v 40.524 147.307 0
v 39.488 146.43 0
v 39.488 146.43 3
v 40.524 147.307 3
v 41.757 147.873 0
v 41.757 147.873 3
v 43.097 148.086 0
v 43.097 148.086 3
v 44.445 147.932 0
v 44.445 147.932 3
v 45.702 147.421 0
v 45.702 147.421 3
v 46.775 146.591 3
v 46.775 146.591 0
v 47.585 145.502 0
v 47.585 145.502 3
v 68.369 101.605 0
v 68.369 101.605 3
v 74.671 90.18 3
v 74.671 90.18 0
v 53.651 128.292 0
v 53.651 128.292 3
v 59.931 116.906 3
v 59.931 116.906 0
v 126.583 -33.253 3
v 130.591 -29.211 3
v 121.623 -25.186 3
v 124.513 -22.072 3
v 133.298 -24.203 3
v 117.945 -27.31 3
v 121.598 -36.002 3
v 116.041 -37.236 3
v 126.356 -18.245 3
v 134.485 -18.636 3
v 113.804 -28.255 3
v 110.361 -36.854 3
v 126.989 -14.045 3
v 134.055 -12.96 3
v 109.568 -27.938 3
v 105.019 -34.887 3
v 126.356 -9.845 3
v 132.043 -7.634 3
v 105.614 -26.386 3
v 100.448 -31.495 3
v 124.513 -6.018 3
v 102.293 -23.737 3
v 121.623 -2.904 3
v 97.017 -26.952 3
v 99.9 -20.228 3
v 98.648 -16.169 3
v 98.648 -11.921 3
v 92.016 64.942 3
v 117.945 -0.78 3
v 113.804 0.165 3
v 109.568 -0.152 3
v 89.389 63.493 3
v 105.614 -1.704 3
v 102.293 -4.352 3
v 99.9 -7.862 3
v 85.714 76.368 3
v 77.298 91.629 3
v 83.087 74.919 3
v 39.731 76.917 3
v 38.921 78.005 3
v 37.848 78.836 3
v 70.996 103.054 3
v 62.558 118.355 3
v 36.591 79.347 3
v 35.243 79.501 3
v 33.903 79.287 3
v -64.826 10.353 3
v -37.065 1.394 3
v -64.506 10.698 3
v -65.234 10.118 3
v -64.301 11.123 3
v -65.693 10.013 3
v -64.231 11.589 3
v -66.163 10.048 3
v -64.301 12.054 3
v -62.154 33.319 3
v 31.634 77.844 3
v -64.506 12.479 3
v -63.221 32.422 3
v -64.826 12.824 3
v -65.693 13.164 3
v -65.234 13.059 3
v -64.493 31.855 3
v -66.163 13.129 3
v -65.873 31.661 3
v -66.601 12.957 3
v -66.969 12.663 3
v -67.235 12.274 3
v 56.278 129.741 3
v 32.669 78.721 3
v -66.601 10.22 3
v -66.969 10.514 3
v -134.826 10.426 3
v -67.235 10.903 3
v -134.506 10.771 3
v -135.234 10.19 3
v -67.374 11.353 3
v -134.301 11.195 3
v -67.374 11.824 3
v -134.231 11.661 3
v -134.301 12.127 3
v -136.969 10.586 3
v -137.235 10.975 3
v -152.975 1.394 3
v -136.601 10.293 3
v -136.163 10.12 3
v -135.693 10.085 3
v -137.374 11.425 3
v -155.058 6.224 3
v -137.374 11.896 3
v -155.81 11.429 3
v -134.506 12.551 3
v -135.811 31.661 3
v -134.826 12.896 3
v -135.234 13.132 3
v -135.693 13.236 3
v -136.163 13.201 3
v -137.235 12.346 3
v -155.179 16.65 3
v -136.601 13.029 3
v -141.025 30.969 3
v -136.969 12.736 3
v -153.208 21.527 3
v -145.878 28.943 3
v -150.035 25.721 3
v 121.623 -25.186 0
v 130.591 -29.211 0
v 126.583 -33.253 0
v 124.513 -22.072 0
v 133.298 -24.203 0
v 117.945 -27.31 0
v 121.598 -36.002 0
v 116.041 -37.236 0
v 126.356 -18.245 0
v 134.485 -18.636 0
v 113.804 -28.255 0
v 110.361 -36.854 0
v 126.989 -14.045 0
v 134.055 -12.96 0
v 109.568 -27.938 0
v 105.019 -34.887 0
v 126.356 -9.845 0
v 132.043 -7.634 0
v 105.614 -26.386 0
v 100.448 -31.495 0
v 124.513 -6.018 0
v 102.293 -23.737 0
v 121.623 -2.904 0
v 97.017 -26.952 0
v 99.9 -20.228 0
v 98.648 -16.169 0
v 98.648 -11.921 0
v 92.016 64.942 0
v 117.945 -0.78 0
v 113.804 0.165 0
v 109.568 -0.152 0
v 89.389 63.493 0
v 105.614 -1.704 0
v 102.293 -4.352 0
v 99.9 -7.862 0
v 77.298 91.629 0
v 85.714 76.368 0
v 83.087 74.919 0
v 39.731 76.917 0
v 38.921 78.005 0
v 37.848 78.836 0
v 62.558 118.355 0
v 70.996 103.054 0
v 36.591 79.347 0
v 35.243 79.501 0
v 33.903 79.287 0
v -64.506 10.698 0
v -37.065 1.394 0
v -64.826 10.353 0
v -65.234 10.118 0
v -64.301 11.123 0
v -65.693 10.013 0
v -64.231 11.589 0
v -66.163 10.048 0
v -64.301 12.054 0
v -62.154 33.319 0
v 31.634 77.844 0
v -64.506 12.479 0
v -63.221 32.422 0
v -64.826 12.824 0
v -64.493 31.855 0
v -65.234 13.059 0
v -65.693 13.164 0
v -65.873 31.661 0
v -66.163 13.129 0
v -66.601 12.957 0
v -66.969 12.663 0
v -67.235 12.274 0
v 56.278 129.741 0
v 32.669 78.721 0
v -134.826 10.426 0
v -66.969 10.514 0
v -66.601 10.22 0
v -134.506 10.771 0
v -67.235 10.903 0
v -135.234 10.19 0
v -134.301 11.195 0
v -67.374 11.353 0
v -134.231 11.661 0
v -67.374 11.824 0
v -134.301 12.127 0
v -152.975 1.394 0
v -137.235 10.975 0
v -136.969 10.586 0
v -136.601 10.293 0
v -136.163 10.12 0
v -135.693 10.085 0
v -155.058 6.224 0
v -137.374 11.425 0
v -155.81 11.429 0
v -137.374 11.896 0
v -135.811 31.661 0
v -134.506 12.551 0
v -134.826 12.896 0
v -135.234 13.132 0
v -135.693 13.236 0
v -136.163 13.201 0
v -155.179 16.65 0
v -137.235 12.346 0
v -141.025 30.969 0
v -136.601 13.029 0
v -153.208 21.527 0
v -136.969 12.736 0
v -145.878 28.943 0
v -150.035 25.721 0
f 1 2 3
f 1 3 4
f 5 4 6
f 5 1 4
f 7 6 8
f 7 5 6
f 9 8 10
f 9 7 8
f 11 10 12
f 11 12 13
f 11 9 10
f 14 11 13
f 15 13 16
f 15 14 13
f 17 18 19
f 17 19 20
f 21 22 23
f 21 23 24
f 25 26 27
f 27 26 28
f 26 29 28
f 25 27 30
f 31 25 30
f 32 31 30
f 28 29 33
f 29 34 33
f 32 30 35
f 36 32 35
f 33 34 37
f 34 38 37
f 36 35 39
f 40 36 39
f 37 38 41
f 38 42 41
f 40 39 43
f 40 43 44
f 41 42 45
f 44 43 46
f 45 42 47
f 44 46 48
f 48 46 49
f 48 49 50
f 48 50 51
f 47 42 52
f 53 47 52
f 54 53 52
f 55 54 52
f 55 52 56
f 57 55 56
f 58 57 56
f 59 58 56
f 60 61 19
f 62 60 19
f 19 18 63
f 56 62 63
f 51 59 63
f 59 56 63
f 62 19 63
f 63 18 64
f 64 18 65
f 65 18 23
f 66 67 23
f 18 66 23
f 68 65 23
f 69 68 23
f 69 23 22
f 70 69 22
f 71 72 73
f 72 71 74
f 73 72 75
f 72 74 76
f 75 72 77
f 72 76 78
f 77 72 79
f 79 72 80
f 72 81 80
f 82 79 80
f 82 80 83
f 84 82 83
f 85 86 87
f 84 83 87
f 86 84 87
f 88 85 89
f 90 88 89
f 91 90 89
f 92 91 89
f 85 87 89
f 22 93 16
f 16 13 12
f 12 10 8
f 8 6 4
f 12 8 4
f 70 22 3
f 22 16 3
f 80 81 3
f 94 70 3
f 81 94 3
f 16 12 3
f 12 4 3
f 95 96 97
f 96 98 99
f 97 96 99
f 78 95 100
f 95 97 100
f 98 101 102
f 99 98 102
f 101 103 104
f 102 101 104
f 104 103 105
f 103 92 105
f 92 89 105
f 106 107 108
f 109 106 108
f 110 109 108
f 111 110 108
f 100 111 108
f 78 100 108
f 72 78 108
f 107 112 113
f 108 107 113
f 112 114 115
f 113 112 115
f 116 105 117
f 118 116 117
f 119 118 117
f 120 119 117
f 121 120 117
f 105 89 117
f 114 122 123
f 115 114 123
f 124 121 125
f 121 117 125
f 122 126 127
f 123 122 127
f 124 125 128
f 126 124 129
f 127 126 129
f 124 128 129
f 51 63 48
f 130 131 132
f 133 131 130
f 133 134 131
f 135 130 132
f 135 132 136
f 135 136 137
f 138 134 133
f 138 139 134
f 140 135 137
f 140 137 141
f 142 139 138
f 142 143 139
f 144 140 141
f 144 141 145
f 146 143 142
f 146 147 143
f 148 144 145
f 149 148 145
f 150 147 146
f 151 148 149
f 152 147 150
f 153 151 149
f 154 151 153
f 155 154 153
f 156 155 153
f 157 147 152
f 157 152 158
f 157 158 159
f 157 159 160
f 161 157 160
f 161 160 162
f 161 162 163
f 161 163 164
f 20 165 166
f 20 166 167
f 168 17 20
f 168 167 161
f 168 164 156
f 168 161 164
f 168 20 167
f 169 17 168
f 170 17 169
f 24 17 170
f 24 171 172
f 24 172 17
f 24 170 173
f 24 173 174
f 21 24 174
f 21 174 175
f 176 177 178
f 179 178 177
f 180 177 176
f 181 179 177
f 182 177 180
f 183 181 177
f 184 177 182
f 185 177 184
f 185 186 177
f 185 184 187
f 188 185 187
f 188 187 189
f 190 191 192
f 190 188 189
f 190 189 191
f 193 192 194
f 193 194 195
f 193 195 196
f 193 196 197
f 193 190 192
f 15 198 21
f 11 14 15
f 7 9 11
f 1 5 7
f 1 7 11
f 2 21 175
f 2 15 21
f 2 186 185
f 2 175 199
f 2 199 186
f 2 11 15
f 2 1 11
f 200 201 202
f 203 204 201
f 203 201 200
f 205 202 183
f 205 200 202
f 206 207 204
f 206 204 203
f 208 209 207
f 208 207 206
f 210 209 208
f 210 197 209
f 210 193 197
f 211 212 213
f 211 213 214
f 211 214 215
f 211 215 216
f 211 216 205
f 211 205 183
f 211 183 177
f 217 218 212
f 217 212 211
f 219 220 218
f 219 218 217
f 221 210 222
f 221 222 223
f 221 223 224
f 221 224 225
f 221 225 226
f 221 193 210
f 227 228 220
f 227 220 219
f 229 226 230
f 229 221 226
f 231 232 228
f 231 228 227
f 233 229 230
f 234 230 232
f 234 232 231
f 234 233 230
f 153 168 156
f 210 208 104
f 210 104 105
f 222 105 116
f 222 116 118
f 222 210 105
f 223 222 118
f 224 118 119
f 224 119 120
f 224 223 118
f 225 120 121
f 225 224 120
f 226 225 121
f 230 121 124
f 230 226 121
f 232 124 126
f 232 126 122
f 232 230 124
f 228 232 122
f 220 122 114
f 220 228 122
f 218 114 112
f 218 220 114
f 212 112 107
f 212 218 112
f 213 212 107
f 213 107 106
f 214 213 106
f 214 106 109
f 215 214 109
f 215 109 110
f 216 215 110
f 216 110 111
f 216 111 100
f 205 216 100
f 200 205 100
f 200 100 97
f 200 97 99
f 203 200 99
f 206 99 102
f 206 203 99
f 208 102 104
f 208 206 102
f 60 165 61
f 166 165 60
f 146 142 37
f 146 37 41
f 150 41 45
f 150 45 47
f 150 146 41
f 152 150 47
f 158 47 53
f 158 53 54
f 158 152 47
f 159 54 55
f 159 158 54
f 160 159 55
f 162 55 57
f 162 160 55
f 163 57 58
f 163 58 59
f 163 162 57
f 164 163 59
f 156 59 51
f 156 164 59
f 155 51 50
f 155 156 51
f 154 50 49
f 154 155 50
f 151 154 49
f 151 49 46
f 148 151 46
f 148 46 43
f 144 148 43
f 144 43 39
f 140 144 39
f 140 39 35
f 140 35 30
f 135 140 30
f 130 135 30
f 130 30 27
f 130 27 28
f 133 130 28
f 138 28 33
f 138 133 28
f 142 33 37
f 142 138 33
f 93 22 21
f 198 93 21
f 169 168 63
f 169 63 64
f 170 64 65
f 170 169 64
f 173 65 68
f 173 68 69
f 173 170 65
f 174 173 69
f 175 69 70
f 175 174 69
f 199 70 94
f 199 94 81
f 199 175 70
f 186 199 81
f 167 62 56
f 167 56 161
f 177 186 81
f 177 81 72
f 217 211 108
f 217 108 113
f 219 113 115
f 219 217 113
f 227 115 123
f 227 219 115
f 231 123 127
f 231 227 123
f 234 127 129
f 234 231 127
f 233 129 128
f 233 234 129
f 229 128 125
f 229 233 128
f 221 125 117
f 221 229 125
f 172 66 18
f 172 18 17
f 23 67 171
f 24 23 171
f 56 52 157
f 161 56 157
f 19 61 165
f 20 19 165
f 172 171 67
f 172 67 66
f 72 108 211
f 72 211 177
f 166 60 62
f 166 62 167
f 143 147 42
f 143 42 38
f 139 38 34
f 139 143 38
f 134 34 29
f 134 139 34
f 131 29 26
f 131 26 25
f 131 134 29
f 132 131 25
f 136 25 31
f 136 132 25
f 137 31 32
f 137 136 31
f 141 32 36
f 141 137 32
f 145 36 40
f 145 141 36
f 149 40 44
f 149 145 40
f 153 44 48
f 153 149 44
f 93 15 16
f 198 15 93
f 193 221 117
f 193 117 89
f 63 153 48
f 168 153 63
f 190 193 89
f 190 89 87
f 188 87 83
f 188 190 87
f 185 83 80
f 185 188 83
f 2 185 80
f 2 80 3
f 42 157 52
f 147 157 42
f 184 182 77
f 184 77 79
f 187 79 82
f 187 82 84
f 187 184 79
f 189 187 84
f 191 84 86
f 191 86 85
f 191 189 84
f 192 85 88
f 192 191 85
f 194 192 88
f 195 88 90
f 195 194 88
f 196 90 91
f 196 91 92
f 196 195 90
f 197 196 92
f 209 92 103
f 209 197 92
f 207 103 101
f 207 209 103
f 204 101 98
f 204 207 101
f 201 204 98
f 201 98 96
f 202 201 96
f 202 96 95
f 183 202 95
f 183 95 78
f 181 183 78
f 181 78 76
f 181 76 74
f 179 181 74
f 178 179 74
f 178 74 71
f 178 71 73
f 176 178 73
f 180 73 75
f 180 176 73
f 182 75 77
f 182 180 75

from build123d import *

# Parameters (mm, degrees)
CROQUIS1_R              = 1.58
CROQUIS1_R_2            = 14.25
SALIENTE_EXTRUIR1_DEPTH = 3
CROQUIS3_W              = 3
CROQUIS3_H              = 13.002457907
CROQUIS3_H_2            = 13.048194377
CROQUIS3_H_3            = 13.048194378
CORTAR_EXTRUIR1_DEPTH   = 3
CROQUIS4_W              = 144.23908533
CROQUIS4_H              = 10
CORTAR_EXTRUIR2_DEPTH   = 10


with BuildPart() as part:
    # Croquis1 → Saliente-Extruir1 (new body)
    with BuildSketch(Plane.XY):
        with BuildLine():
            Line((-135.811178416, 31.660861846), (-65.873242367, 31.660861846))
            ThreePointArc((-65.873242367, 31.660861846), (-63.837291884, 32.094144685), (-62.154198363, 33.318899594))
            Line((-62.154198363, 33.318899594), (39.488020824, 146.429658271))
            ThreePointArc((39.488020824, 146.429658271), (43.775922453, 148.055230719), (47.585333219, 145.502393908))
            Line((47.585333219, 145.502393908), (132.043103592, -7.634273033))
            ThreePointArc((132.043103592, -7.634273033), (124.188821584, -34.806138154), (97.016956463, -26.951856146))
            Line((97.016956463, -26.951856146), (39.731279169, 76.917067288))
            ThreePointArc((39.731279169, 76.917067288), (35.921868403, 79.4699041), (31.633966774, 77.844331652))
            Line((31.633966774, 77.844331652), (-44.321252629, -6.681100406))
            ThreePointArc((-44.321252629, -6.681100406), (-46.00434615, -7.905855315), (-48.040296633, -8.339138154))
            Line((-48.040296633, -8.339138154), (-135.811178416, -8.339138154))
            ThreePointArc((-135.811178416, -8.339138154), (-155.811178416, 11.660861846), (-135.811178416, 31.660861846))
        make_face()
        with Locations((-135.811178416, 11.660861846)):
            Circle(CROQUIS1_R, mode=Mode.SUBTRACT)
        with Locations((-65.81121578, 11.5885363)):
            Circle(CROQUIS1_R, mode=Mode.SUBTRACT)
        with Locations((112.738617641, -14.044921514)):
            Circle(CROQUIS1_R_2, mode=Mode.SUBTRACT)
    extrude(amount=SALIENTE_EXTRUIR1_DEPTH)

    # Croquis3 → Cortar-Extruir1 (cut)
    with BuildSketch(Plane(origin=(98.018165522, 54.058873563, 0), x_dir=(0, 0, -1), z_dir=(0.875653678217041, 0.4829395778200074, 0))):
        with Locations((-1.5, 79.927636726)):
            Rectangle(CROQUIS3_W, CROQUIS3_H)
        with Locations((-1.5, 49.42886568)):
            Rectangle(CROQUIS3_W, CROQUIS3_H_2)
        with Locations((-1.5, 18.952962868)):
            Rectangle(CROQUIS3_W, CROQUIS3_H_3)
    extrude(amount=-CORTAR_EXTRUIR1_DEPTH, mode=Mode.SUBTRACT)

    # Croquis4 → Cortar-Extruir2 (cut)
    with BuildSketch(Plane.XY.offset(3)):
        with Locations((-102.474853033, -3.605700694)):
            Rectangle(CROQUIS4_W, CROQUIS4_H)
    extrude(amount=-CORTAR_EXTRUIR2_DEPTH, mode=Mode.SUBTRACT)


solid = part.part
